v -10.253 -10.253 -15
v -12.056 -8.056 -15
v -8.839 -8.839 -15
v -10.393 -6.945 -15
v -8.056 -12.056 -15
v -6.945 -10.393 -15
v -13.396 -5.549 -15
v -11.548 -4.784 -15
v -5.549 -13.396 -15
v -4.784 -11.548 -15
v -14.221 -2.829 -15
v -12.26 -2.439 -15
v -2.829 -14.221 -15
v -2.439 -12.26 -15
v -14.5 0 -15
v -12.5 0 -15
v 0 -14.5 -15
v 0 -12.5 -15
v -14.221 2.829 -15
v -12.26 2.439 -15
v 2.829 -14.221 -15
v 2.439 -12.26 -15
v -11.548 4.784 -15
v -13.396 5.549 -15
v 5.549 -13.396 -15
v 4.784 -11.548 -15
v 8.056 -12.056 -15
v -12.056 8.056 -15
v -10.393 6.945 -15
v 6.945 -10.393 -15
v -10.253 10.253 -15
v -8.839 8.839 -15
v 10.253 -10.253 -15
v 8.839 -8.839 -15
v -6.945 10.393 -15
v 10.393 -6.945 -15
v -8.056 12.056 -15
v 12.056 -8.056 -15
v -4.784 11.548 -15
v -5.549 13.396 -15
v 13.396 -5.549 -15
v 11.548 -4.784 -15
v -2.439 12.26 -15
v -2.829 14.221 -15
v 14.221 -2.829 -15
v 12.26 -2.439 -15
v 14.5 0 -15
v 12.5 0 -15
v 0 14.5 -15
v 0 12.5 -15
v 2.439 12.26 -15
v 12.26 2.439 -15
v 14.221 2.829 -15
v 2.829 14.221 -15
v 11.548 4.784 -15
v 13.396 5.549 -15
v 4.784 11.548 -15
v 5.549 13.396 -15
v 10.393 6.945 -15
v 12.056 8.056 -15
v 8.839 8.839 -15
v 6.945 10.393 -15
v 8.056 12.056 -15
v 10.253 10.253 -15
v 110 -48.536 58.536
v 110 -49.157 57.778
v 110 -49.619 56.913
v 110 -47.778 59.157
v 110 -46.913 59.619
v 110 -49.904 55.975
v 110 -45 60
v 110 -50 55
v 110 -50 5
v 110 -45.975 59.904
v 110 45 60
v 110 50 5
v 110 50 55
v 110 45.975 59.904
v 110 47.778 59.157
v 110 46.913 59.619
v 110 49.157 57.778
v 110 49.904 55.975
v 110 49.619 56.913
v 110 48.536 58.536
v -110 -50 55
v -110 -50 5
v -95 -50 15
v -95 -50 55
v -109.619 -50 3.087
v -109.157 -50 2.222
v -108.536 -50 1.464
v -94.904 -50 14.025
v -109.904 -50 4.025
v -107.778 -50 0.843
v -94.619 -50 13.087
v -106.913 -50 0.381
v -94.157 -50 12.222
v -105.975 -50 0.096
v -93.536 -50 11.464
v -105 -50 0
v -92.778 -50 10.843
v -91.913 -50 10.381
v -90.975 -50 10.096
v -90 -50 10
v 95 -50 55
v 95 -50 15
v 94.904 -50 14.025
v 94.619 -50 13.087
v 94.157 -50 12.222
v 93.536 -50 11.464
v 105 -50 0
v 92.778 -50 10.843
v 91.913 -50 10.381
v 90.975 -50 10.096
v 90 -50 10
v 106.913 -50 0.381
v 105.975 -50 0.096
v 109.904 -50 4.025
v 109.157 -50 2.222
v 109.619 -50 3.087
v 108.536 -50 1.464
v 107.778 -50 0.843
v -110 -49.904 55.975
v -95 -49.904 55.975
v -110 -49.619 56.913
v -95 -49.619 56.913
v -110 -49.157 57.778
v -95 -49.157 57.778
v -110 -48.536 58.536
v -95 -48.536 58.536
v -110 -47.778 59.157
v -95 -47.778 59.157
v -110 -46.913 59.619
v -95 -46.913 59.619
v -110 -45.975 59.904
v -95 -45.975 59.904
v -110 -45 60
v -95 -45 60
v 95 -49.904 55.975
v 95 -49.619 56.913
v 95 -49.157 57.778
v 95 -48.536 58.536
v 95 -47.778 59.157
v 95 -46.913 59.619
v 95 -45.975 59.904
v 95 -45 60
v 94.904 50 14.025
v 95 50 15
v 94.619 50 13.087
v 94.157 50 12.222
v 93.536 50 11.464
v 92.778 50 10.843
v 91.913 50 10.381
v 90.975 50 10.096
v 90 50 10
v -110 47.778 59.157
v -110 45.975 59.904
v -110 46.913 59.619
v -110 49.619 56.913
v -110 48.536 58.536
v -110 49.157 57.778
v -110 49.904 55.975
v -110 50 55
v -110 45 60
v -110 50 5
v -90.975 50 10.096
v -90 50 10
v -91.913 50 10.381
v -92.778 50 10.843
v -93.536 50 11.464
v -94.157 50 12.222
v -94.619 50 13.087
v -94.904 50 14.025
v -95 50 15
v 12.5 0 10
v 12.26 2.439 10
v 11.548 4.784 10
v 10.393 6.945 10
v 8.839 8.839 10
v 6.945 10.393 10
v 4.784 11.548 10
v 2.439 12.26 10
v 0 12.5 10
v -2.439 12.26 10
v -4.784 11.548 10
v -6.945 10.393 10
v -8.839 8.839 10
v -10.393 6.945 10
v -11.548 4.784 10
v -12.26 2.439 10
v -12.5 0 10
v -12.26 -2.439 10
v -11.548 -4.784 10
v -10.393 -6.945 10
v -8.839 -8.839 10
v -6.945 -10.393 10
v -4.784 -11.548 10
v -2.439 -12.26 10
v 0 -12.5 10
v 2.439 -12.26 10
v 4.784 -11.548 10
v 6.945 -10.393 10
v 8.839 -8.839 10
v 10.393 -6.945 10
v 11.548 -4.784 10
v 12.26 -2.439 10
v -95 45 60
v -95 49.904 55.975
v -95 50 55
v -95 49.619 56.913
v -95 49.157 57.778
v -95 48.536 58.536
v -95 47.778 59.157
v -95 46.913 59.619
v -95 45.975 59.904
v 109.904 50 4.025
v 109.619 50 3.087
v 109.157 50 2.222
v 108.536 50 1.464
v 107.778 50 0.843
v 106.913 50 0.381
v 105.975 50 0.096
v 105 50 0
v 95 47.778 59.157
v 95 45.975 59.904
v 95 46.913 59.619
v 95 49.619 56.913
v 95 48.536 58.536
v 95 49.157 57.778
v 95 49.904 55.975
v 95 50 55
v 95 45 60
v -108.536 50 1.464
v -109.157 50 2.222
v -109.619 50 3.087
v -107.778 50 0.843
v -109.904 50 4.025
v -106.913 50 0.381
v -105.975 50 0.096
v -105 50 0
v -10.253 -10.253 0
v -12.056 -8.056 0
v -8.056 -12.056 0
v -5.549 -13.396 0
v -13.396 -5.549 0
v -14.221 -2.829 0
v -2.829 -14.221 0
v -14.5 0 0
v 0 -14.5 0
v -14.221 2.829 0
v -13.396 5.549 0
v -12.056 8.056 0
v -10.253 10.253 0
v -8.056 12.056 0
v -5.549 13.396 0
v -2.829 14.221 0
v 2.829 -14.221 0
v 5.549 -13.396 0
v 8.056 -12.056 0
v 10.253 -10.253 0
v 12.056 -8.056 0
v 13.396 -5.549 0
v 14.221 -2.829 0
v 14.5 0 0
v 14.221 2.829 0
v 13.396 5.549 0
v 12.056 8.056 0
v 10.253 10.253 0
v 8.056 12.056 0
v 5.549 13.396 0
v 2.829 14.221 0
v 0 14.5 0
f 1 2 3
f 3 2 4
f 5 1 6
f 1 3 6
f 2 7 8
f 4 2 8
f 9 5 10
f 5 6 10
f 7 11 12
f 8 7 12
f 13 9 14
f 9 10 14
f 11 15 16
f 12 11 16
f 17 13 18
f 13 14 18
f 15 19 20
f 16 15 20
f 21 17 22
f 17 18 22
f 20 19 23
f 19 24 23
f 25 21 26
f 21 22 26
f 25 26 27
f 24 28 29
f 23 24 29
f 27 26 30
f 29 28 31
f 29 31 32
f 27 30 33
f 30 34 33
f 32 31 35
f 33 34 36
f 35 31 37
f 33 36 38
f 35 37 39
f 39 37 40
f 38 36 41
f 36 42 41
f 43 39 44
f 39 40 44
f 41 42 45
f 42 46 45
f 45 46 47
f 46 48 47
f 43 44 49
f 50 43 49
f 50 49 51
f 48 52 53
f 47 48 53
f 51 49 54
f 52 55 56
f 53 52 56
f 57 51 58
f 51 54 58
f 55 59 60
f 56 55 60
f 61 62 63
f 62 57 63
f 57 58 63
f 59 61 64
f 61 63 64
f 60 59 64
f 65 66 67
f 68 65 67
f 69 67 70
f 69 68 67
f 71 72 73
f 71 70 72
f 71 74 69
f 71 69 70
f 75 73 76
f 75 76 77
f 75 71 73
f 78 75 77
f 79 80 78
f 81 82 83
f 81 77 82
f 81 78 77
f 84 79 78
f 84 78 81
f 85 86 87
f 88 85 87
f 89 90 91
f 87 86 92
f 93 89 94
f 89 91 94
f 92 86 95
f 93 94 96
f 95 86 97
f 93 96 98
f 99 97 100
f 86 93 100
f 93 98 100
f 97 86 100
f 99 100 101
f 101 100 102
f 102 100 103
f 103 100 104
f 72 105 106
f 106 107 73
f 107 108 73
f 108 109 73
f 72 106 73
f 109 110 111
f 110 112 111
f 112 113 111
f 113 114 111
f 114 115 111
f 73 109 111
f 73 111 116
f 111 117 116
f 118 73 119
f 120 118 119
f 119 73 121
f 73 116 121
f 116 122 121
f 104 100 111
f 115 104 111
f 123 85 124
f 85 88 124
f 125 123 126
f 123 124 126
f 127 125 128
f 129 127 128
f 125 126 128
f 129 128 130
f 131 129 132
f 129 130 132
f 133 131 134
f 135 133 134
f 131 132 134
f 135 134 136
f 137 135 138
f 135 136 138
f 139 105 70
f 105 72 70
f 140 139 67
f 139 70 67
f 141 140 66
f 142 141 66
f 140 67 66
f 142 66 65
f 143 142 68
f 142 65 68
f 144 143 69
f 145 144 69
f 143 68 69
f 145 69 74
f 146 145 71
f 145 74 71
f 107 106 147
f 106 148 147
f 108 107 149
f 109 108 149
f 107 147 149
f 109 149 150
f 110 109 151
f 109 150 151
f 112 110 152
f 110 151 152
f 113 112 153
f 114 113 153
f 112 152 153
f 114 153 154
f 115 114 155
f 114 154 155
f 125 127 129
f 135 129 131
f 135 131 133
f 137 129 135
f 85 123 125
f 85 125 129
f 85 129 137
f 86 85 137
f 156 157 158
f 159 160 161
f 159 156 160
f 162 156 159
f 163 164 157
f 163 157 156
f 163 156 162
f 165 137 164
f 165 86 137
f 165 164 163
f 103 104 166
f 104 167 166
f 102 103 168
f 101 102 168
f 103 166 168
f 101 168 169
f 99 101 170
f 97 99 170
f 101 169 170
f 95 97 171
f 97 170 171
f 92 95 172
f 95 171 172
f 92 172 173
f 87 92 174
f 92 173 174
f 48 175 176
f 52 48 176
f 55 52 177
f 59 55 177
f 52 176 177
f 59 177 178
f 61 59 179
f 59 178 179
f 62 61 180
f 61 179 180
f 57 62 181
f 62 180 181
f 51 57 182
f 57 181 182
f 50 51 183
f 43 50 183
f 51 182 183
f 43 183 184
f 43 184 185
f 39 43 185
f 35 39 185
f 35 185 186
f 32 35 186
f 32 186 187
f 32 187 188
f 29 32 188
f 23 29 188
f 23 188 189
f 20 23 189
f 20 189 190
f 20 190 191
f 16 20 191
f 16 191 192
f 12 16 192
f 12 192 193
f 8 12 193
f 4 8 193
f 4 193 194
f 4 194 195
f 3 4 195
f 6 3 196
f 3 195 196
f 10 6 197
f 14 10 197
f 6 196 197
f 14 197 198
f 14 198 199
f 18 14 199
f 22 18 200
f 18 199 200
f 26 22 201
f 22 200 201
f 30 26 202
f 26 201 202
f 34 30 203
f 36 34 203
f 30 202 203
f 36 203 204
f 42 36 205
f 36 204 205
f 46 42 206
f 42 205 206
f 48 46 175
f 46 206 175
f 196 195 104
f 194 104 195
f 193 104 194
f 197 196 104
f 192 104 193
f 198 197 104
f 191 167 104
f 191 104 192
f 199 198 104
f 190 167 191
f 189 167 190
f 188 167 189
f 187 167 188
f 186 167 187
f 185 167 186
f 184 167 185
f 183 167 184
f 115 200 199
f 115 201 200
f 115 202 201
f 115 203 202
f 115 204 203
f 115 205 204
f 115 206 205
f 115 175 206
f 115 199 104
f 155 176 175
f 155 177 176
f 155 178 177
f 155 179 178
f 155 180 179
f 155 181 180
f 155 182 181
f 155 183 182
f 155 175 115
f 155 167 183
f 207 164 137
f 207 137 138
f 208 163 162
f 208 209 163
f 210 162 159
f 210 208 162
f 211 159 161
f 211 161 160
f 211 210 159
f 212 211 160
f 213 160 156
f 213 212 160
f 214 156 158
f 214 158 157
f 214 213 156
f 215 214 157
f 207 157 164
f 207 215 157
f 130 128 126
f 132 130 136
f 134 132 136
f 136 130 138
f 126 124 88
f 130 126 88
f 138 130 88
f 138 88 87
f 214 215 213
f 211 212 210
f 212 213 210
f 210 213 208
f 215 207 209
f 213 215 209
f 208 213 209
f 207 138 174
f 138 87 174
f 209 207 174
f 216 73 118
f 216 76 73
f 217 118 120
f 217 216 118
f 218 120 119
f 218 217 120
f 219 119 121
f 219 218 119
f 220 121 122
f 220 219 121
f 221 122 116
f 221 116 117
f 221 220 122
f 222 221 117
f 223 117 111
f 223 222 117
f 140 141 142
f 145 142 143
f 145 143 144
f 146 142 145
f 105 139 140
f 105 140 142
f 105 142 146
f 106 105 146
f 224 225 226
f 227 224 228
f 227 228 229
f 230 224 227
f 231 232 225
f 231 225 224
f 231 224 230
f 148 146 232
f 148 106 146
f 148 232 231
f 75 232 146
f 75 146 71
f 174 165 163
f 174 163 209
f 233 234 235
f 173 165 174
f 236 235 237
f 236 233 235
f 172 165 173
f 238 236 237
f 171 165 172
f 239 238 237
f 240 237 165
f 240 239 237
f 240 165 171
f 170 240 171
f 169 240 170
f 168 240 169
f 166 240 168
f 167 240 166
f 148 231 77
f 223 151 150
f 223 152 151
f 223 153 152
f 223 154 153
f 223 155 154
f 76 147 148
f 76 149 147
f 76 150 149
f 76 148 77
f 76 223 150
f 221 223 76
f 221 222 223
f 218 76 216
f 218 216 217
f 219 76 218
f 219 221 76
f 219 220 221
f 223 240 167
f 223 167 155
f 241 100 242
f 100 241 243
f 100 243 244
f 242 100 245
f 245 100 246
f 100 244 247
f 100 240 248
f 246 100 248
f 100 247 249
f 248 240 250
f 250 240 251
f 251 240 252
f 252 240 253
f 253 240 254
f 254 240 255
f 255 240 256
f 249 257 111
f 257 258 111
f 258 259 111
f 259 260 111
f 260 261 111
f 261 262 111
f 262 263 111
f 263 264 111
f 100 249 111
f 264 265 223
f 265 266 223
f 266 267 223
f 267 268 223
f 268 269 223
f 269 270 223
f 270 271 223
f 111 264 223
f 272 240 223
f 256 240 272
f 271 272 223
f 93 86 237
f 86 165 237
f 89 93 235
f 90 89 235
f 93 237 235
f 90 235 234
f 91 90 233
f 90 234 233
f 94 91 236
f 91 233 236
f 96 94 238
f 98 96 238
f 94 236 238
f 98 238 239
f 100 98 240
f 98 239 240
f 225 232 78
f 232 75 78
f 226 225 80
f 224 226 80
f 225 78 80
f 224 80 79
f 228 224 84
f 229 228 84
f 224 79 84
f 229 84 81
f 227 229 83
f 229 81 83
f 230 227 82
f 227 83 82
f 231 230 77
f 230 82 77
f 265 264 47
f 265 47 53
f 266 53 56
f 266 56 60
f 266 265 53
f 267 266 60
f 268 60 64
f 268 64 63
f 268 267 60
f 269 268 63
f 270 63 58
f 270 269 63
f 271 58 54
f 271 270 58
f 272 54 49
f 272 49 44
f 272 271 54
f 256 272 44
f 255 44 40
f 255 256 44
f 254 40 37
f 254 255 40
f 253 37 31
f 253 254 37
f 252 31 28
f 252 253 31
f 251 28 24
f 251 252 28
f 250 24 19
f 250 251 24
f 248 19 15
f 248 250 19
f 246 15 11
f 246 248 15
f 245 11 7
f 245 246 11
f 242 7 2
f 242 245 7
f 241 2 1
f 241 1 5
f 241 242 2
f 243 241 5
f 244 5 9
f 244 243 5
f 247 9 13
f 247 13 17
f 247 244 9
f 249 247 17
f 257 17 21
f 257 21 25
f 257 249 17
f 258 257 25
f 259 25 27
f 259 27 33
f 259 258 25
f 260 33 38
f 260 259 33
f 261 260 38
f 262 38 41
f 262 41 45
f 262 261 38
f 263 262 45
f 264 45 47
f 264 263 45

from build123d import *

# Parameters (mm, degrees)
SKETCH_1_R        = 14.5
SKETCH_1_R_2      = 12.5
EXTRUDE_1_DEPTH   = 15
EXTRUDE_START     = 10
SKETCH_1_3_W      = 220
SKETCH_1_3_H      = 100
SKETCH_1_3_R      = 12.5
EXTRUDE_1_2_DEPTH = 10
SKETCH_2_W        = 15
SKETCH_2_H        = 100
EXTRUDE_2_DEPTH   = 50
FILLET_1_R        = 5


with BuildPart() as part:
    # 草图1 → Extrude 1 (new body)
    with BuildSketch(Plane.XY):
        Circle(SKETCH_1_R)
        Circle(SKETCH_1_R_2, mode=Mode.SUBTRACT)
    extrude(amount=-EXTRUDE_1_DEPTH)

    # 草图1<3> → Extrude 1 2 (add)
    with BuildSketch(Plane.XY.offset(EXTRUDE_START)):
        Rectangle(SKETCH_1_3_W, SKETCH_1_3_H)
        Circle(SKETCH_1_3_R, mode=Mode.SUBTRACT)
    extrude(amount=-EXTRUDE_1_2_DEPTH)

    # 草图2 → 凸台-拉伸2 (add)
    with BuildSketch(Plane.XY.offset(10)):
        with Locations((-102.5, 0)):
            Rectangle(SKETCH_2_W, SKETCH_2_H)
        with Locations((102.5, 0)):
            Rectangle(SKETCH_2_W, SKETCH_2_H)
    extrude(amount=EXTRUDE_2_DEPTH)

    # 圆角1
    fillet_1_edges = [part.edges().sort_by_distance(p)[0] for p in [
        (-110, 0, 0),
        (110, 0, 0),
        (-95, 0, 10),
        (-102.5, -50, 60),
        (-102.5, 50, 60),
        (95, 0, 10),
        (102.5, 50, 60),
        (102.5, -50, 60),
    ]]
    fillet(fillet_1_edges, radius=FILLET_1_R)


solid = part.part
